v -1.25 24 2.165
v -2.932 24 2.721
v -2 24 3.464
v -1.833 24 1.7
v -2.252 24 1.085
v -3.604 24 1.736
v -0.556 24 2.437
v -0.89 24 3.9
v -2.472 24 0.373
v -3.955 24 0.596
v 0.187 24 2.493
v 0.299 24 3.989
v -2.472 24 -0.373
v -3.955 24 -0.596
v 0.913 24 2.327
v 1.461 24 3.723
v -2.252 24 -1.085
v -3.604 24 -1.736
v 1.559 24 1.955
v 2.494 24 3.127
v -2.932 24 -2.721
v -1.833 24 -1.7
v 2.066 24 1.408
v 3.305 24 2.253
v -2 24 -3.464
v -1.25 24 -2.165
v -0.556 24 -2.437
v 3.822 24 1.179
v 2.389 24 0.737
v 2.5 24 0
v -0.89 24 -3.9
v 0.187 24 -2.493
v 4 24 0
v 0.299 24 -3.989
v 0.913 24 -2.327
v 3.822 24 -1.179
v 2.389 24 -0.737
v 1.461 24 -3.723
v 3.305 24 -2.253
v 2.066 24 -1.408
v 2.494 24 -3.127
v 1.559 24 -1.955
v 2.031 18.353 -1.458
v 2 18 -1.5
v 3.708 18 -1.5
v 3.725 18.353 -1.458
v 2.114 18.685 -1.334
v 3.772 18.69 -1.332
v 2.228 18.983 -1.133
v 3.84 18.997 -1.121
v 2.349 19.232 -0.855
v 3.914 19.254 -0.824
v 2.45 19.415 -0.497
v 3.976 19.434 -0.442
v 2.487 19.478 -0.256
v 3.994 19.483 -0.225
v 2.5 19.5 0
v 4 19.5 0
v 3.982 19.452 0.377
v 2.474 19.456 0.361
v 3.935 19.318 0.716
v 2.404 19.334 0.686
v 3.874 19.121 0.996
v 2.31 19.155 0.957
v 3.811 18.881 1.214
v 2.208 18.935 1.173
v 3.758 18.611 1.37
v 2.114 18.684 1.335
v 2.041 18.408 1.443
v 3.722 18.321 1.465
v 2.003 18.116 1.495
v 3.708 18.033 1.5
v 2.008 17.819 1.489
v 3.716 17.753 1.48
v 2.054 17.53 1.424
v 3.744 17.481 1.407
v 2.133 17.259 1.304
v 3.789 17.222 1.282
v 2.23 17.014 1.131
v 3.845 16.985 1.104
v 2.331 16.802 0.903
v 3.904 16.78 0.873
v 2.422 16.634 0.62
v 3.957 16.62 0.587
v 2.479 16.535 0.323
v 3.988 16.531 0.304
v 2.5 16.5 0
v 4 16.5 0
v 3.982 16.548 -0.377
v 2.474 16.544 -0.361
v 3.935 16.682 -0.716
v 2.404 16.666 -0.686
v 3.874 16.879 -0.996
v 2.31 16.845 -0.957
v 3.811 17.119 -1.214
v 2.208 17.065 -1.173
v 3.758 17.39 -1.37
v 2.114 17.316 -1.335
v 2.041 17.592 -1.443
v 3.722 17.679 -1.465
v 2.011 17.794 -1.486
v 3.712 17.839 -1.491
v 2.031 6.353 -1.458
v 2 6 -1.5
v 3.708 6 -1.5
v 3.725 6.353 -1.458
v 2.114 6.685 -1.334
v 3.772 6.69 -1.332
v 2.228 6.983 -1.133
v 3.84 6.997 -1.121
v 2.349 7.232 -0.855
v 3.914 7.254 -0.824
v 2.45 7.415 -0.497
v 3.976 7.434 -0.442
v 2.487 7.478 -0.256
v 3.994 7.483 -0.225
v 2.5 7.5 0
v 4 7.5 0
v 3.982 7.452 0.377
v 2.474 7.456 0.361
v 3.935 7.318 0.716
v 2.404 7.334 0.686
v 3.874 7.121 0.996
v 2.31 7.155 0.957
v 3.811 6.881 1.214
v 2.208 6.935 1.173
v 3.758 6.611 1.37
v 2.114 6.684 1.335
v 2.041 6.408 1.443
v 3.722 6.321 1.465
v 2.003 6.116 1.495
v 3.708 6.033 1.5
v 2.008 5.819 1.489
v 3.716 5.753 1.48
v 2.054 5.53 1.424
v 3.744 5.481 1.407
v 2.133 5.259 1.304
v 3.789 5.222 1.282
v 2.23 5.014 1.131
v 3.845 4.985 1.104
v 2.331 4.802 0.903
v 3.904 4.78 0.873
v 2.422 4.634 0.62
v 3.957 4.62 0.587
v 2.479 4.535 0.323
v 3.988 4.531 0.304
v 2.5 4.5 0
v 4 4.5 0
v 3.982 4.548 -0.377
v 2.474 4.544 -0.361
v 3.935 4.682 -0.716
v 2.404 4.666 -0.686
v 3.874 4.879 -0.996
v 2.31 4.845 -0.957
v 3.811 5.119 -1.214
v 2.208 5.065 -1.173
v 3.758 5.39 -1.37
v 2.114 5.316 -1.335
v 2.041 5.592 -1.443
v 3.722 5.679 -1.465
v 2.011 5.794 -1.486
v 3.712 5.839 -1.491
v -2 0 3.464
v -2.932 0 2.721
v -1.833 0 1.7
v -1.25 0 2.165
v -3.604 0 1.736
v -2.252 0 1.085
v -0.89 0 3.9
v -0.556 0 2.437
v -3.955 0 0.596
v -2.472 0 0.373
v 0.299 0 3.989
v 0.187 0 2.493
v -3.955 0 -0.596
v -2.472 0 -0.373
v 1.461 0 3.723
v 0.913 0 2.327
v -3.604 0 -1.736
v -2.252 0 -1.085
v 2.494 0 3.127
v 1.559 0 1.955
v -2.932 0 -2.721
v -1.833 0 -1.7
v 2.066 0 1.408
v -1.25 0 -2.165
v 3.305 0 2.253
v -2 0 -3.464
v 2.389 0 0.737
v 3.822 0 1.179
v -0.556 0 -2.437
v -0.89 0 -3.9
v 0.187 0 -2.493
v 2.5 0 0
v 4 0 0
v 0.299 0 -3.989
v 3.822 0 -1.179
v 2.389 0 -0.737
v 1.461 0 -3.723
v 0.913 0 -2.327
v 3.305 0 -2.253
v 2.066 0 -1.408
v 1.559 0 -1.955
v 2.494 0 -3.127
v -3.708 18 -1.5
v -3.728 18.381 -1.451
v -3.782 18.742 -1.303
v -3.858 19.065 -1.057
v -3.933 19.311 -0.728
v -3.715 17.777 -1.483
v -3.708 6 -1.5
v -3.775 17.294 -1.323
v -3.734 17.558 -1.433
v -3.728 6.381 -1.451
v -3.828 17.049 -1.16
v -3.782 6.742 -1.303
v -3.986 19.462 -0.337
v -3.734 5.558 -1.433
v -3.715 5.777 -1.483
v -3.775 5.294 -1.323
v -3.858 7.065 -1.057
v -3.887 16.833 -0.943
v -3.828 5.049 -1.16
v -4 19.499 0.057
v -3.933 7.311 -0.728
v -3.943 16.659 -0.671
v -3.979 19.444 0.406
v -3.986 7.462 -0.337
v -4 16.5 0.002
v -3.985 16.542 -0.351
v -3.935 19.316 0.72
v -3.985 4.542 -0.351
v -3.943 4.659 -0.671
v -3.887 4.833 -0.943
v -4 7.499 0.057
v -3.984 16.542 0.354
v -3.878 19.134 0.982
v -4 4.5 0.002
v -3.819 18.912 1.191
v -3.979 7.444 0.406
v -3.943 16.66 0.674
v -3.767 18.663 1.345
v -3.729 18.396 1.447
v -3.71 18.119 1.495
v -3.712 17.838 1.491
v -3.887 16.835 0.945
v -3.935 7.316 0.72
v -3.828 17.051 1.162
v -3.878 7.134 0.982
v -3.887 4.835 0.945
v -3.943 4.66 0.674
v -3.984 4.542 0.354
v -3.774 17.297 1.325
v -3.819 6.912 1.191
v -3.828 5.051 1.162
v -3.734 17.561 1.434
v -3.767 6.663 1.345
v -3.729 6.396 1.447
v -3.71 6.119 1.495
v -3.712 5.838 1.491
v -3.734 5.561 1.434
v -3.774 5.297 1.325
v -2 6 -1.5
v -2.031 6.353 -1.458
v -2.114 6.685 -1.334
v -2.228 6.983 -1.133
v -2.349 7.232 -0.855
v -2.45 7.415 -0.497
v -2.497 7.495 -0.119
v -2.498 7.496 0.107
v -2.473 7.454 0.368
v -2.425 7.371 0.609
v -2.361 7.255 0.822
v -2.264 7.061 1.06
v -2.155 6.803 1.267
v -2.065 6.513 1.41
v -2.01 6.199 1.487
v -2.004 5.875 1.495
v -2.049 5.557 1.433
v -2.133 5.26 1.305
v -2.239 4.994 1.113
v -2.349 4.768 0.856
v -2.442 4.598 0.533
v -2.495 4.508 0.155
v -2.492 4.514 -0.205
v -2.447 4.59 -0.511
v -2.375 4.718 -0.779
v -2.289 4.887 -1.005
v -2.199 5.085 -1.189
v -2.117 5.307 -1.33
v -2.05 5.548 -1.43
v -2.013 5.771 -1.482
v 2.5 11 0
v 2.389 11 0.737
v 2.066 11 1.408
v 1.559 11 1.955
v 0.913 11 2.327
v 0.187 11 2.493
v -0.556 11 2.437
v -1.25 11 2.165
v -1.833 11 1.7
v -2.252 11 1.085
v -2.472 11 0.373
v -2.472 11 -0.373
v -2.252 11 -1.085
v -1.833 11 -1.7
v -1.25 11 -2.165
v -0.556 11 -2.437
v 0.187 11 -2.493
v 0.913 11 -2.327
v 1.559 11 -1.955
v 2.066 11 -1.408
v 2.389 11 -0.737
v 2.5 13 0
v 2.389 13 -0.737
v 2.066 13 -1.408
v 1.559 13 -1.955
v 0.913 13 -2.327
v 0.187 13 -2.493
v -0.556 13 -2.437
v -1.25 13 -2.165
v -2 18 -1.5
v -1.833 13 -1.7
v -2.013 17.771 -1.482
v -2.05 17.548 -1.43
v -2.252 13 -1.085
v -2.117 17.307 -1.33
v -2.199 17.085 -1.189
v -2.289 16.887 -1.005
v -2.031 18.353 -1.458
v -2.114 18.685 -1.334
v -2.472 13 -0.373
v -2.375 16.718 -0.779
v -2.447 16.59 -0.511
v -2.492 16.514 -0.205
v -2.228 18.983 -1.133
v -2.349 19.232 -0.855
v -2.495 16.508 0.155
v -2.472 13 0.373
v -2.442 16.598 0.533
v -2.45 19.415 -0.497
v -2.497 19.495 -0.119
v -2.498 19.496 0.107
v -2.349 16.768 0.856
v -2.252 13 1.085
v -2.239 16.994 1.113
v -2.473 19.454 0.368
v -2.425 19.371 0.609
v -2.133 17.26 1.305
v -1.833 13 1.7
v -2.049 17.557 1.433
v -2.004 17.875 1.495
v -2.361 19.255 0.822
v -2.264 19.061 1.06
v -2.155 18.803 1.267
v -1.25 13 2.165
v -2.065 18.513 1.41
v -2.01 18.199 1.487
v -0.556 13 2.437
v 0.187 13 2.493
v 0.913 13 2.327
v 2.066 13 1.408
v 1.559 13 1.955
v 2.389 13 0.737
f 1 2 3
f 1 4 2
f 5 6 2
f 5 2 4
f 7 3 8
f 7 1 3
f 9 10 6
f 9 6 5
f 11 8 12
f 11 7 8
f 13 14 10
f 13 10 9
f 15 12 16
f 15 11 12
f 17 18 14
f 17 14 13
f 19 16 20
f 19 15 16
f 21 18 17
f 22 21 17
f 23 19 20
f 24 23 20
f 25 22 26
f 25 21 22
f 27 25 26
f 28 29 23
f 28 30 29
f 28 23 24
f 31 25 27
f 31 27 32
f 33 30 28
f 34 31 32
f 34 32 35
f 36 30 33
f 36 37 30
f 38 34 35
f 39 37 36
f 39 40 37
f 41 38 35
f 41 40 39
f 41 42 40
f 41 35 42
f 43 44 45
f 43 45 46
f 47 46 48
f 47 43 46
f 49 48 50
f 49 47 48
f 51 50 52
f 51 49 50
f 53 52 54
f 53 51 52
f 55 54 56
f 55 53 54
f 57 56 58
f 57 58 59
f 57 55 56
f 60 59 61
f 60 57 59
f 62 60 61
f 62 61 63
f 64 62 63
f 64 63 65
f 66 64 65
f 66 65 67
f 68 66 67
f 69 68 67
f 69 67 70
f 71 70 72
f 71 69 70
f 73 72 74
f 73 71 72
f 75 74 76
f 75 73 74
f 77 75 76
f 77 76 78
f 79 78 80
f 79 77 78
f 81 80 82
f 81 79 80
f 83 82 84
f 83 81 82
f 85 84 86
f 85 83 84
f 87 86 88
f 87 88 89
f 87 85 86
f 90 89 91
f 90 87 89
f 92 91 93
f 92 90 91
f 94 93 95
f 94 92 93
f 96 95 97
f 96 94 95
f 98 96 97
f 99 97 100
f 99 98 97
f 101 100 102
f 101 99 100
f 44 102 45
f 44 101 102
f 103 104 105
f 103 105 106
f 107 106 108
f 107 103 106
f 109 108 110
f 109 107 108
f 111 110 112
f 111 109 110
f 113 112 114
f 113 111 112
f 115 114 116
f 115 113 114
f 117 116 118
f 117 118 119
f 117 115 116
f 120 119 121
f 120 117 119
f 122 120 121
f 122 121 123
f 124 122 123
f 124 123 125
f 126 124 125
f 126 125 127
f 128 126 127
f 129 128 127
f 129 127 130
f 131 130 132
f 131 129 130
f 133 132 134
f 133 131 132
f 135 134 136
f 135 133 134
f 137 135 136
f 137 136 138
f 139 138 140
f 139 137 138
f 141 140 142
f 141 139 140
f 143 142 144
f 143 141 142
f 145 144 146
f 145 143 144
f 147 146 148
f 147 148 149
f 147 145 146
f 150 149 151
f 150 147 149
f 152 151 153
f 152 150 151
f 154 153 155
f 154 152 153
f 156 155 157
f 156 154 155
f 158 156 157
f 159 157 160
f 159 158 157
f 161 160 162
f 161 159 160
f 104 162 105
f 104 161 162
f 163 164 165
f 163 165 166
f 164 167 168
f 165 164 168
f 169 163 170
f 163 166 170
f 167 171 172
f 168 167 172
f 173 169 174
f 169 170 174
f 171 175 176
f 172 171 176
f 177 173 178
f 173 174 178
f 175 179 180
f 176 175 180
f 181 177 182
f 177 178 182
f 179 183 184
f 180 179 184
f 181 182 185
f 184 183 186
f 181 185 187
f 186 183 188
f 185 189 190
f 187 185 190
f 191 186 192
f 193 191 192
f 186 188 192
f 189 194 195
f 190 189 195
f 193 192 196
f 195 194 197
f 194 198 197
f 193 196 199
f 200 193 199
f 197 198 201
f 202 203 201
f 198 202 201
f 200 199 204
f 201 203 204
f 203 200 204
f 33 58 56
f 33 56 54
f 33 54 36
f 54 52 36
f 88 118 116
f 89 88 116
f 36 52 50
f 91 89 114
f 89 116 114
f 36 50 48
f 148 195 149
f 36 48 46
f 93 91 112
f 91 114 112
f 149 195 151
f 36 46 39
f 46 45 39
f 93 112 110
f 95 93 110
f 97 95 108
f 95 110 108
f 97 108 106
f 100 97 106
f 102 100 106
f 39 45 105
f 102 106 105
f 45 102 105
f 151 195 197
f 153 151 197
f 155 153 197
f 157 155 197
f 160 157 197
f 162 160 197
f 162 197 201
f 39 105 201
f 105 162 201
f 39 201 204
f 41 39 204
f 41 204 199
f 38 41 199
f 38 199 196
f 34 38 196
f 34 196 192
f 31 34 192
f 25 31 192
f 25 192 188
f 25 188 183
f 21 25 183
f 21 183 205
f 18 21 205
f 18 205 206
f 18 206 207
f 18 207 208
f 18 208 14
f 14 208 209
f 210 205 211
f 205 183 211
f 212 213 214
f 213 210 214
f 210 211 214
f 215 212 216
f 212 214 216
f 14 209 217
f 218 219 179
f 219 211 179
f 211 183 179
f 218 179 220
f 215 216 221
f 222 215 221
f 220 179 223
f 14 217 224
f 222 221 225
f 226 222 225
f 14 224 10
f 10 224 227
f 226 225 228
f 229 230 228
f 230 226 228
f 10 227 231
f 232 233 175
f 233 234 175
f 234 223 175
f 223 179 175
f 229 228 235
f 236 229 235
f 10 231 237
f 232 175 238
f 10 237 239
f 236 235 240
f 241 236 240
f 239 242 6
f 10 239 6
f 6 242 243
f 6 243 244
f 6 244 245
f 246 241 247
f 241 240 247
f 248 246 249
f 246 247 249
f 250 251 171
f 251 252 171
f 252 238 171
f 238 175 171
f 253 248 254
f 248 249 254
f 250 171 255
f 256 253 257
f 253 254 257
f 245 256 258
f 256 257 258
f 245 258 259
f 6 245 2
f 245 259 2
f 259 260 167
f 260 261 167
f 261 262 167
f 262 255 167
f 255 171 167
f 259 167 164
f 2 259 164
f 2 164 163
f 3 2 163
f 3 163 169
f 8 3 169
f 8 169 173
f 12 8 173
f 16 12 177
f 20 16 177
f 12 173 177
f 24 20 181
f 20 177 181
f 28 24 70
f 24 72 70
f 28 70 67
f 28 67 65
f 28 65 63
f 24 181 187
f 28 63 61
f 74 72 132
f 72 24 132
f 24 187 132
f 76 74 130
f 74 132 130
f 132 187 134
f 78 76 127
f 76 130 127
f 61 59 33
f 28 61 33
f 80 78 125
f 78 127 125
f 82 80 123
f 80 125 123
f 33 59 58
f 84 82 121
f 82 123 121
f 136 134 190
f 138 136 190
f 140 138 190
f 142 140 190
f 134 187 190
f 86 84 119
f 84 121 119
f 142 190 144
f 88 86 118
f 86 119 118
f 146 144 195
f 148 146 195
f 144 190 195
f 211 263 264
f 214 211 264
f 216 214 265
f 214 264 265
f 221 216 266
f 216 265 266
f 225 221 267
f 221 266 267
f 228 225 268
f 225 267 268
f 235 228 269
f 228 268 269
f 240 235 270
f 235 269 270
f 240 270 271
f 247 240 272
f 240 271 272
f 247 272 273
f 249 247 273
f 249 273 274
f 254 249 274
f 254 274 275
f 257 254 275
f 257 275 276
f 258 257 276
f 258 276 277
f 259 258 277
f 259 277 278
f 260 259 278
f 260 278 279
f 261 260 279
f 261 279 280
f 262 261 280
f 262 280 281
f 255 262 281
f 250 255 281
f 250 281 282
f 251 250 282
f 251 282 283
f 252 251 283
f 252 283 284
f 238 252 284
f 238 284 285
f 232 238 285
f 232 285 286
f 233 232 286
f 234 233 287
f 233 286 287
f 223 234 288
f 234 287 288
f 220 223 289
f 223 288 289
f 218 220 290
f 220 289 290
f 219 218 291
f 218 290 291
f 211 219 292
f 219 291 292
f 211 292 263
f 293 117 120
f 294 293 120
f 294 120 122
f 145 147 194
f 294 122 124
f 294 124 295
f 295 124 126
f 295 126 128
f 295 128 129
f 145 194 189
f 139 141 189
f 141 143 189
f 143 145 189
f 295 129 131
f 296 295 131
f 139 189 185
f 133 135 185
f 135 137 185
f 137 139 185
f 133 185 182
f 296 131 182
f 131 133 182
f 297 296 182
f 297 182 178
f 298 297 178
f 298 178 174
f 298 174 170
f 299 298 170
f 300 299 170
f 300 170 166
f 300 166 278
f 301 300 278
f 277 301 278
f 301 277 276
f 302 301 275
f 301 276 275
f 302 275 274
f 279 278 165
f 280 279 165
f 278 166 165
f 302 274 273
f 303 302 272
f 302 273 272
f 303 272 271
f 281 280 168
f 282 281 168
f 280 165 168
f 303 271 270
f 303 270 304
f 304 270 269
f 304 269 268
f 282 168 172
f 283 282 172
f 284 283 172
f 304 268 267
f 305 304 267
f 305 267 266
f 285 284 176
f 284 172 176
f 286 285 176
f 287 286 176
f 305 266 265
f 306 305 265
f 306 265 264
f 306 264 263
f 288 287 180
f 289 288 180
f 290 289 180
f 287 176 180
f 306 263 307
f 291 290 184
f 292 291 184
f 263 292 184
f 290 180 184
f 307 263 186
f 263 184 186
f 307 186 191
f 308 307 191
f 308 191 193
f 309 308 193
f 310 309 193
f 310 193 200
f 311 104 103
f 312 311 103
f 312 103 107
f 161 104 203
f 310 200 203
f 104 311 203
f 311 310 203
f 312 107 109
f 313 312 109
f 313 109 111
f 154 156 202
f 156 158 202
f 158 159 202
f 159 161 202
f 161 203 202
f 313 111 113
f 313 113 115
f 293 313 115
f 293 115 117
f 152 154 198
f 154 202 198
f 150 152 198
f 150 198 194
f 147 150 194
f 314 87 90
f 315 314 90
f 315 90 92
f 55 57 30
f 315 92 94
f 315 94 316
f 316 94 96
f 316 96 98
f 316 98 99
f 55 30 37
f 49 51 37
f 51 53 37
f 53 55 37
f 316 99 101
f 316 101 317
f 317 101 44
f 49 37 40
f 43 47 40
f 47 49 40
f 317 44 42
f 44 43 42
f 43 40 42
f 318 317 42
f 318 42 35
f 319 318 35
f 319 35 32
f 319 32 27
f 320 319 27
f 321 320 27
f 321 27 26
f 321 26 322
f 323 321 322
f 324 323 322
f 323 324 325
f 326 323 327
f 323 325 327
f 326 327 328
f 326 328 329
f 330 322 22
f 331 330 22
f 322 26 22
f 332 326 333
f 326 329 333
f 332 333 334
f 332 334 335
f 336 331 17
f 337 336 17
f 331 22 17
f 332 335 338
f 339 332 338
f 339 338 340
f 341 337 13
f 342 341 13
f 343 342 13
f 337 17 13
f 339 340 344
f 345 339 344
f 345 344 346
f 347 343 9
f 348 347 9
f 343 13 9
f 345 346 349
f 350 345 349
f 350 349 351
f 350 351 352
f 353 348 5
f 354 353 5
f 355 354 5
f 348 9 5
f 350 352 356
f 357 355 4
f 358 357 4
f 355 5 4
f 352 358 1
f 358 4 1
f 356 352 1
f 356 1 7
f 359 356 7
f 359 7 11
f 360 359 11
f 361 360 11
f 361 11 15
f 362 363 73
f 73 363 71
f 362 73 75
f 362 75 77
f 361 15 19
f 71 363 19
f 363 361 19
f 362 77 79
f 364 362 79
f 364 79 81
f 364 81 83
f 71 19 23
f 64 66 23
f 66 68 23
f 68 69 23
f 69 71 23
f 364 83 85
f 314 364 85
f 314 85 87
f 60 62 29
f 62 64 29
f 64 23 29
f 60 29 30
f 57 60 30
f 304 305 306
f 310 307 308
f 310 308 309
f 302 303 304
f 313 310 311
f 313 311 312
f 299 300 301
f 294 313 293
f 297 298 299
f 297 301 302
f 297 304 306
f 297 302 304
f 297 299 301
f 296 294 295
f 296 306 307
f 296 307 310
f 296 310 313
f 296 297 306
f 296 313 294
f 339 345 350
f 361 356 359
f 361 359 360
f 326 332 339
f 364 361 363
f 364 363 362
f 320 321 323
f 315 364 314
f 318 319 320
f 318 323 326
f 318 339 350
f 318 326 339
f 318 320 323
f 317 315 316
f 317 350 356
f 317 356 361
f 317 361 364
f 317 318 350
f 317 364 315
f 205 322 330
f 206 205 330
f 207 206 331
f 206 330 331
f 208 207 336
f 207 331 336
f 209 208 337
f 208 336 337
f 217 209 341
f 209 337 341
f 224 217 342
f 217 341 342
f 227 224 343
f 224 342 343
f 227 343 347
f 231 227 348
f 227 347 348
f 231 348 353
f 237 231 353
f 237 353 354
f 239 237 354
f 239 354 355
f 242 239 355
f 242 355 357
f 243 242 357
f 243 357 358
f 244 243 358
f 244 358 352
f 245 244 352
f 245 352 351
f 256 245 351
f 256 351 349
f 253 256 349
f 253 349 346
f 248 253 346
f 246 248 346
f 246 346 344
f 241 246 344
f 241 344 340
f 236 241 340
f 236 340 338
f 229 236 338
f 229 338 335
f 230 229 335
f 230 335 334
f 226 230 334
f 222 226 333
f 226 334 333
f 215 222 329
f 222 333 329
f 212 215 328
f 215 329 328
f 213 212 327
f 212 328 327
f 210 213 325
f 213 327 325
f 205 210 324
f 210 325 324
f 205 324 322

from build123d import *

# Parameters (mm, degrees)
SKETCH1_R               = 4
BOSS_EXTRUDE1_DEPTH     = 24
SKETCH2_R               = 2.5
CUT_EXTRUDE1_DEPTH      = 11
CUT_EXTRUDE2_START      = -11
SKETCH3_R               = 2.5
CUT_EXTRUDE2_DEPTH      = 11
CUT_EXTRUDE3_DEPTH      = 11
CUT_EXTRUDE3_DEPTH_BACK = 11
SKETCH4_R               = 1.5


with BuildPart() as part:
    # Sketch1 → Boss-Extrude1 (new body)
    with BuildSketch(Plane(origin=(0, 0, 0), x_dir=(1, 0, 0), z_dir=(0, 1, 0))):
        Circle(SKETCH1_R)
    extrude(amount=BOSS_EXTRUDE1_DEPTH)

    # Sketch2 → Cut-Extrude1 (cut)
    with BuildSketch(Plane(origin=(0, 24, 0), x_dir=(1, 0, 0), z_dir=(0, 1, 0))):
        Circle(SKETCH2_R)
    extrude(amount=-CUT_EXTRUDE1_DEPTH, mode=Mode.SUBTRACT)

    # Sketch3 → Cut-Extrude2 (cut)
    with BuildSketch(Plane.XZ.offset(CUT_EXTRUDE2_START)):
        Circle(SKETCH3_R)
    extrude(amount=CUT_EXTRUDE2_DEPTH, mode=Mode.SUBTRACT)

    # Sketch4 → Cut-Extrude3 (cut, two sides: drawn at the far end of the back side and taken through both)
    with BuildSketch(Plane(origin=(0, 0, 0), x_dir=(0, 0, -1), z_dir=(1, 0, 0)).offset(-CUT_EXTRUDE3_DEPTH_BACK)):
        with Locations((0, 18)):
            Circle(SKETCH4_R)
        with Locations((0, 6)):
            Circle(SKETCH4_R)
    extrude(amount=CUT_EXTRUDE3_DEPTH + CUT_EXTRUDE3_DEPTH_BACK, mode=Mode.SUBTRACT)


solid = part.part
